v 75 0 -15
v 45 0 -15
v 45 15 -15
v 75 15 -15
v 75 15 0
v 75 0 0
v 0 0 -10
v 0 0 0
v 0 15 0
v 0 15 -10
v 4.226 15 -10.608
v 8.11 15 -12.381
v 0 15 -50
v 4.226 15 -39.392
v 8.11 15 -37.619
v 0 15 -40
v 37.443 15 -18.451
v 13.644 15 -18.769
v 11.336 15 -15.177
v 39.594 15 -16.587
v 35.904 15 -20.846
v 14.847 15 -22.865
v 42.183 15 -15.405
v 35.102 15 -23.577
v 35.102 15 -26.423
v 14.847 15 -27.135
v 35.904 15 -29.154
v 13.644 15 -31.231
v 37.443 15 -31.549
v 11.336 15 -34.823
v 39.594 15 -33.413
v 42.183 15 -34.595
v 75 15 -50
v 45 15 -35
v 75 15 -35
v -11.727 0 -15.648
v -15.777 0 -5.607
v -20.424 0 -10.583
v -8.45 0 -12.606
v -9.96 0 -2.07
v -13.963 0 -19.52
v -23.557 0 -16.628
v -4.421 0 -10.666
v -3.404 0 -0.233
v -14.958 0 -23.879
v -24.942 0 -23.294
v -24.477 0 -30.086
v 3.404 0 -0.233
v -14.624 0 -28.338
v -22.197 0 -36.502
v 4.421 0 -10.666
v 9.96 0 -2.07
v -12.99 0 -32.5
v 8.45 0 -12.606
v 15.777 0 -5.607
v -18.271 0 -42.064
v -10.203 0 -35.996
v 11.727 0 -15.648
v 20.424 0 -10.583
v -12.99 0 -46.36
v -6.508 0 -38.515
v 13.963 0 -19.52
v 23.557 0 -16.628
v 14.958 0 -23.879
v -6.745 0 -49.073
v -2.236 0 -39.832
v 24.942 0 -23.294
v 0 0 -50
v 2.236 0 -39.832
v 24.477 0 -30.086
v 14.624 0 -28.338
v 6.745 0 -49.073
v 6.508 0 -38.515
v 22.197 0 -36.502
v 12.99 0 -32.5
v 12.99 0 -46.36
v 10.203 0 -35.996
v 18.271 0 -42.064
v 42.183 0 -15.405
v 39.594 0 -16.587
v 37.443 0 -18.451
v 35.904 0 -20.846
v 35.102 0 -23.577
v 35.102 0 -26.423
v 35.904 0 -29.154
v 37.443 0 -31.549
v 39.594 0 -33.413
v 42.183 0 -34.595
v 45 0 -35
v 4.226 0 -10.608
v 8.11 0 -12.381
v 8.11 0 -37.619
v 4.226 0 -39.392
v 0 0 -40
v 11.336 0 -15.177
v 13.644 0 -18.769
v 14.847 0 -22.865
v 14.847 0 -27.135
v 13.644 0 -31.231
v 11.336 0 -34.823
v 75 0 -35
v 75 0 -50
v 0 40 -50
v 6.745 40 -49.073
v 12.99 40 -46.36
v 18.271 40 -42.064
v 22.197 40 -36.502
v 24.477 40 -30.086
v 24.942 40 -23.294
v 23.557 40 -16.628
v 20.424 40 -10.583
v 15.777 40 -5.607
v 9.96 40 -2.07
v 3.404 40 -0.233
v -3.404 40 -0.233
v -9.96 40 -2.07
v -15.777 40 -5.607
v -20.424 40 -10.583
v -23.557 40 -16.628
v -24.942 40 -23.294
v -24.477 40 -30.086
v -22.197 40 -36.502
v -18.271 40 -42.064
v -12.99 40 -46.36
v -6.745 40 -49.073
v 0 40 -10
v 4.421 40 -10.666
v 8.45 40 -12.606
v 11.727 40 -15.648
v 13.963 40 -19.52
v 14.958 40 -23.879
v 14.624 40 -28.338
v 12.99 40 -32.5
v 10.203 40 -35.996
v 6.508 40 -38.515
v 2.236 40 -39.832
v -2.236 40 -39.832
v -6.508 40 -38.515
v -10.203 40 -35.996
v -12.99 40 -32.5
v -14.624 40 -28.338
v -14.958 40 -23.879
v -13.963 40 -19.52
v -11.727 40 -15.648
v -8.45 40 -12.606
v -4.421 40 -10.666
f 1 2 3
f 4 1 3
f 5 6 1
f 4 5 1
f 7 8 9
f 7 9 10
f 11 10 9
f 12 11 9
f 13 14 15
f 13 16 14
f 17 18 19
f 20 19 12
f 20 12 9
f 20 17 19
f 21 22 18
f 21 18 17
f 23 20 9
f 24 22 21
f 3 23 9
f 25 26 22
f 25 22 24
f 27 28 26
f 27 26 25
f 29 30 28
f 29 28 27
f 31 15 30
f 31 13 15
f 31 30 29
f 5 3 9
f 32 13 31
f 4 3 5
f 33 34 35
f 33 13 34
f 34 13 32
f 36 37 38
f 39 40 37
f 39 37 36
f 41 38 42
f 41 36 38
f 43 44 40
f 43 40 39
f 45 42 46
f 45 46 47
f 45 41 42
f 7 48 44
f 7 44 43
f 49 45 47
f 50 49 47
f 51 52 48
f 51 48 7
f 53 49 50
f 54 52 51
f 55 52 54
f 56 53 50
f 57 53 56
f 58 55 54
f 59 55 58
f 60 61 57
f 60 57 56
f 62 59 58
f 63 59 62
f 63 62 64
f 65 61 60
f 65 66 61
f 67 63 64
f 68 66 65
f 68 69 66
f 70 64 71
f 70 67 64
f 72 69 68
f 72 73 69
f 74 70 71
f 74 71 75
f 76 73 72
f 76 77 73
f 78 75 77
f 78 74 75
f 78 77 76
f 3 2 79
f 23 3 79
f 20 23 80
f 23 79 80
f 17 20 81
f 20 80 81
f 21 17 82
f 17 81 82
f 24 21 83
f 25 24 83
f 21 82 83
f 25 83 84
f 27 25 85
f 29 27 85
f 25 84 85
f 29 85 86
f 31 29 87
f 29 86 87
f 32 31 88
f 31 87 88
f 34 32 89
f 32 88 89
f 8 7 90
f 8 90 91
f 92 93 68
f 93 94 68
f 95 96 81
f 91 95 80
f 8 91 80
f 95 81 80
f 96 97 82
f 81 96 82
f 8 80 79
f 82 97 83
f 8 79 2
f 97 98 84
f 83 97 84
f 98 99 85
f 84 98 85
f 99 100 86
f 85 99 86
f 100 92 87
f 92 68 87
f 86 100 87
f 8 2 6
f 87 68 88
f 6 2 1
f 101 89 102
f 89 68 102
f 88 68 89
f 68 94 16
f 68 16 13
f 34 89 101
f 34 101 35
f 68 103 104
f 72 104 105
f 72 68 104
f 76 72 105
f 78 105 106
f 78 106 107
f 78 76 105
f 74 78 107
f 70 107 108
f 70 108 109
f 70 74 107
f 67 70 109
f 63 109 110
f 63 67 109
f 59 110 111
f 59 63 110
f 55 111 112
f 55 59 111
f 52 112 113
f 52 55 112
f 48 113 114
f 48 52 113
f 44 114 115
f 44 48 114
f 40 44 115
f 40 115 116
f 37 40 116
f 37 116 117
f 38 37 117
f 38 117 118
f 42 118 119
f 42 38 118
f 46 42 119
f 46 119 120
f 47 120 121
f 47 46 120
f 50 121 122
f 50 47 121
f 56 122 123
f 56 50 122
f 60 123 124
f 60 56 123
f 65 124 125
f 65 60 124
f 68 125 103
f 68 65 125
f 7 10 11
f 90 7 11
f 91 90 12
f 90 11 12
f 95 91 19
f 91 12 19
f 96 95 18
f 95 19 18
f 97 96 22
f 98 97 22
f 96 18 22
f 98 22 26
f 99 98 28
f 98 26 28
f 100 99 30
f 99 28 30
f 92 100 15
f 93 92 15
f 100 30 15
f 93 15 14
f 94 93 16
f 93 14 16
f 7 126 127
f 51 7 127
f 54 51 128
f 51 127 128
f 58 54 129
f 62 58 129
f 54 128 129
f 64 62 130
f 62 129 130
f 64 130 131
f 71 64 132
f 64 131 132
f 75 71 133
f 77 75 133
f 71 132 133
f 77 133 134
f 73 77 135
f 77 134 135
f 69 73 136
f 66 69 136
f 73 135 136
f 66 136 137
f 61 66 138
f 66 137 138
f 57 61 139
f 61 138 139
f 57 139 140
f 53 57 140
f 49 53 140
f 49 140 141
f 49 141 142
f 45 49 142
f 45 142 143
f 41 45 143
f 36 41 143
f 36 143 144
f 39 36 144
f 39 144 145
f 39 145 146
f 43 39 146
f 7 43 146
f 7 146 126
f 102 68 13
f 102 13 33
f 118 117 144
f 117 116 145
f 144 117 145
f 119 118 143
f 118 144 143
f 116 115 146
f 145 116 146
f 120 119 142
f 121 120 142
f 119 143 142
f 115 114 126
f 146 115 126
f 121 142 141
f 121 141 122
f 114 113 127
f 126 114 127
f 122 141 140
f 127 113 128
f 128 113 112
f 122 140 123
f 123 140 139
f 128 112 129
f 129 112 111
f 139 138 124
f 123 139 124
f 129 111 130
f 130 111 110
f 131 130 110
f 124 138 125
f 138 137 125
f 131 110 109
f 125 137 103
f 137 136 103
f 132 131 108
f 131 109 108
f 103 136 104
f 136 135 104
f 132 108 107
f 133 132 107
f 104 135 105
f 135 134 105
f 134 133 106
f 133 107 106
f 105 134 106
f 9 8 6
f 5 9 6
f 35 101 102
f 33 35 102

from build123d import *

# Parameters (mm, degrees)
SKETCH1_W               = 75
SKETCH1_H               = 50
BOSS_EXTRUDE1_DEPTH     = 15
SKETCH2_R               = 25
BOSS_EXTRUDE2_DEPTH     = 40
SKETCH3_R               = 15
CUT_EXTRUDE1_DEPTH      = 99.615414617
SKETCH5_W               = 10
SKETCH5_H               = 15
CUT_EXTRUDE2_REACH      = 120.743
CUT_EXTRUDE2_END_RADIUS = 10
SKETCH7_W               = 20
SKETCH7_H               = 15


with BuildPart() as part:
    # Sketch1 → Boss-Extrude1 (new body)
    with BuildSketch(Plane(origin=(0, 0, 0), x_dir=(1, 0, 0), z_dir=(0, 1, 0))):
        with Locations((37.5, 25)):
            Rectangle(SKETCH1_W, SKETCH1_H)
    extrude(amount=BOSS_EXTRUDE1_DEPTH)


with BuildPart() as body_2:
    # Sketch2 → Boss-Extrude2 (new body)
    with BuildSketch(Plane.XZ):
        with Locations(Location((0, -25, 0), (0, 0, 270))):
            Circle(SKETCH2_R)
    extrude(amount=-BOSS_EXTRUDE2_DEPTH)


with BuildPart() as cut_extrude1_tool:
    # Sketch3 → Cut-Extrude1 (new, through all)
    with BuildSketch(Plane(origin=(0, 40, 0), x_dir=(1, 0, 0), z_dir=(0, 1, 0))):
        with Locations(Location((0, 25, 0), (0, 0, 270))):
            Circle(SKETCH3_R)
    extrude(amount=-CUT_EXTRUDE1_DEPTH)


with BuildPart() as part_1:
    add(part.part)

    # Cut-Extrude1: cut by cut_extrude1_tool
    add(cut_extrude1_tool.part, mode=Mode.SUBTRACT)

    # Sketch5 → Ø20.0 (20) Diameter Hole1 (revolve, cut)
    with BuildSketch(Plane(origin=(45, 15, -25), x_dir=(0, 0, 1), z_dir=(1, 0, 0))):
        with Locations((5, 7.5)):
            Rectangle(SKETCH5_W, SKETCH5_H)
    revolve(axis=Axis((45, 21.35, -25), (0, -1, 0)), mode=Mode.SUBTRACT)

    # Cut-Extrude2: up to this cylinder (the profile starts outside it)
    cut_extrude2_end = Plane(origin=(45, 7.5, -25), z_dir=(0, 1, 0)) * Cylinder(CUT_EXTRUDE2_END_RADIUS, 262.486, mode=Mode.PRIVATE)
    # Sketch7 → Cut-Extrude2 (cut, up to the surface)
    with BuildSketch(Plane(origin=(75, 0, 0), x_dir=(0, 0, -1), z_dir=(1, 0, 0)), mode=Mode.PRIVATE) as cut_extrude2_sk1:
        with Locations((25, 7.5)):
            Rectangle(SKETCH7_W, SKETCH7_H)
    cut_extrude2_tool1 = extrude(cut_extrude2_sk1.sketch, amount=-CUT_EXTRUDE2_REACH, mode=Mode.PRIVATE) - cut_extrude2_end
    add(cut_extrude2_tool1.solids().sort_by_distance((75, 7.5, -25))[0], mode=Mode.SUBTRACT)


with BuildPart() as body_2_1:
    add(body_2.part)

    # Cut-Extrude1: cut by cut_extrude1_tool
    add(cut_extrude1_tool.part, mode=Mode.SUBTRACT)


solid = Compound([part_1.part, body_2_1.part])
